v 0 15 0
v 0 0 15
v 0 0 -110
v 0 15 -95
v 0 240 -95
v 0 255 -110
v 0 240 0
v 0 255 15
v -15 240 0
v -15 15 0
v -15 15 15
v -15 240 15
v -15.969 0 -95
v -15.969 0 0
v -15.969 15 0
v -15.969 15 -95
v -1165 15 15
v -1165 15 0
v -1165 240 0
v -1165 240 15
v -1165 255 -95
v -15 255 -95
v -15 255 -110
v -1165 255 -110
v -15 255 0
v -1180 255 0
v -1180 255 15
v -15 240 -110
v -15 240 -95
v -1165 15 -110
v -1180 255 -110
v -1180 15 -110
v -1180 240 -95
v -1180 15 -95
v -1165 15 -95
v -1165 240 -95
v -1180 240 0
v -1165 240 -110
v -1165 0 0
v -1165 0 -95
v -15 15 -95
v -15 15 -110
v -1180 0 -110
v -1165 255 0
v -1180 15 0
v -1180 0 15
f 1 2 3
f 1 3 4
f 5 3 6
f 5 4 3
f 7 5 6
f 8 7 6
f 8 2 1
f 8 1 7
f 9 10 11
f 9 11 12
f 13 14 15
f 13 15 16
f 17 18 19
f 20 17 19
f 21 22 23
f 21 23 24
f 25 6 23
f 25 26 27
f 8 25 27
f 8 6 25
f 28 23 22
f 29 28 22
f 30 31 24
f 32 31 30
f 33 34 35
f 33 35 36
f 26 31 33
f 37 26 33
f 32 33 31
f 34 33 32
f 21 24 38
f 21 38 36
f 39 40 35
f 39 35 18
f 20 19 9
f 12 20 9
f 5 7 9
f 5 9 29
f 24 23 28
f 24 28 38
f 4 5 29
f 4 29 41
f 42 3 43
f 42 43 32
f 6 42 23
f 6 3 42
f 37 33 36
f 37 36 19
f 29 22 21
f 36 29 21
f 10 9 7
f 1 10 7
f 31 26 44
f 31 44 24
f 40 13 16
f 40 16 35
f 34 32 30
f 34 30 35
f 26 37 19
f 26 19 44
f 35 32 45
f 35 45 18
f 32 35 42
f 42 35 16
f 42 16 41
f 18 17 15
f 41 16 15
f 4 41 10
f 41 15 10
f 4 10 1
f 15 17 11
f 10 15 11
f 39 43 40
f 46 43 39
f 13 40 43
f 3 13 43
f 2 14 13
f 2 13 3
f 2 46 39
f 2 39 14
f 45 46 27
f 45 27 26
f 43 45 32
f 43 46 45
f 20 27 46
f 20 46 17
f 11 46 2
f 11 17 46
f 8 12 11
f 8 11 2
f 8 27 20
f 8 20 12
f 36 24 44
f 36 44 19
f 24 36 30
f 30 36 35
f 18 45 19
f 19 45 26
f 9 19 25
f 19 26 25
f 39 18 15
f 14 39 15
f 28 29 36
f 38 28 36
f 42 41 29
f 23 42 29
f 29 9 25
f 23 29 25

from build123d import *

# Parameters (mm, degrees)
F0_W      = 1180
F0_H      = 255
F0_W_2    = 1150
F0_H_2    = 225
F1_DEPTH  = 15
F3_DEPTH  = 15
F5_DEPTH  = 15
F8_DEPTH  = 15
F10_W     = 1150
F10_H     = 15
F11_DEPTH = 15


with BuildPart() as f1:
    # F0 (on Top) → F1 (new body)
    with BuildSketch(Plane.XY):
        with Locations((-590, 127.5)):
            Rectangle(F0_W, F0_H)
        with Locations((-590, 127.5)):
            Rectangle(F0_W_2, F0_H_2, mode=Mode.SUBTRACT)
    extrude(amount=F1_DEPTH)

    # F2 (on Front) → F3 (join)
    with BuildSketch(Plane.XZ):
        Polygon((0, -110), (0, 0), (-15.9693145752, 0), (-15.9693145752, -15), (-15.9693145752, -95), (-1165, -95), (-1165, -15), (-1165, 0), (-1180, 0), (-1180, -110), align=None)
    extrude(amount=-F3_DEPTH)

    # F4 (on Right) → F5 (join)
    with BuildSketch(Plane.YZ):
        Polygon((15, -95), (15, -110), (255, -110), (255, 0), (240, 0), (240, -95), align=None)
    extrude(amount=-F5_DEPTH)


with BuildPart() as f8:
    # F7 (on offset) → F8 (new body)
    with BuildSketch(Plane(origin=(-1180, 0, 0), x_dir=(0, -1, 0), z_dir=(-1, 0, 0))):
        Polygon((-255, -110), (-15, -110), (-15, -95), (-240, -95), (-240, 0), (-255, 0), align=None)
    extrude(amount=-F8_DEPTH)


with BuildPart() as f11:
    # F10 (on offset) → F11 (new body)
    with BuildSketch(Plane(origin=(0, 255, 0), x_dir=(-1, 0, 0), z_dir=(0, 1, 0))):
        with Locations((590, -102.5)):
            Rectangle(F10_W, F10_H)
    extrude(amount=-F11_DEPTH)


solid = Compound([f1.part, f8.part, f11.part])
